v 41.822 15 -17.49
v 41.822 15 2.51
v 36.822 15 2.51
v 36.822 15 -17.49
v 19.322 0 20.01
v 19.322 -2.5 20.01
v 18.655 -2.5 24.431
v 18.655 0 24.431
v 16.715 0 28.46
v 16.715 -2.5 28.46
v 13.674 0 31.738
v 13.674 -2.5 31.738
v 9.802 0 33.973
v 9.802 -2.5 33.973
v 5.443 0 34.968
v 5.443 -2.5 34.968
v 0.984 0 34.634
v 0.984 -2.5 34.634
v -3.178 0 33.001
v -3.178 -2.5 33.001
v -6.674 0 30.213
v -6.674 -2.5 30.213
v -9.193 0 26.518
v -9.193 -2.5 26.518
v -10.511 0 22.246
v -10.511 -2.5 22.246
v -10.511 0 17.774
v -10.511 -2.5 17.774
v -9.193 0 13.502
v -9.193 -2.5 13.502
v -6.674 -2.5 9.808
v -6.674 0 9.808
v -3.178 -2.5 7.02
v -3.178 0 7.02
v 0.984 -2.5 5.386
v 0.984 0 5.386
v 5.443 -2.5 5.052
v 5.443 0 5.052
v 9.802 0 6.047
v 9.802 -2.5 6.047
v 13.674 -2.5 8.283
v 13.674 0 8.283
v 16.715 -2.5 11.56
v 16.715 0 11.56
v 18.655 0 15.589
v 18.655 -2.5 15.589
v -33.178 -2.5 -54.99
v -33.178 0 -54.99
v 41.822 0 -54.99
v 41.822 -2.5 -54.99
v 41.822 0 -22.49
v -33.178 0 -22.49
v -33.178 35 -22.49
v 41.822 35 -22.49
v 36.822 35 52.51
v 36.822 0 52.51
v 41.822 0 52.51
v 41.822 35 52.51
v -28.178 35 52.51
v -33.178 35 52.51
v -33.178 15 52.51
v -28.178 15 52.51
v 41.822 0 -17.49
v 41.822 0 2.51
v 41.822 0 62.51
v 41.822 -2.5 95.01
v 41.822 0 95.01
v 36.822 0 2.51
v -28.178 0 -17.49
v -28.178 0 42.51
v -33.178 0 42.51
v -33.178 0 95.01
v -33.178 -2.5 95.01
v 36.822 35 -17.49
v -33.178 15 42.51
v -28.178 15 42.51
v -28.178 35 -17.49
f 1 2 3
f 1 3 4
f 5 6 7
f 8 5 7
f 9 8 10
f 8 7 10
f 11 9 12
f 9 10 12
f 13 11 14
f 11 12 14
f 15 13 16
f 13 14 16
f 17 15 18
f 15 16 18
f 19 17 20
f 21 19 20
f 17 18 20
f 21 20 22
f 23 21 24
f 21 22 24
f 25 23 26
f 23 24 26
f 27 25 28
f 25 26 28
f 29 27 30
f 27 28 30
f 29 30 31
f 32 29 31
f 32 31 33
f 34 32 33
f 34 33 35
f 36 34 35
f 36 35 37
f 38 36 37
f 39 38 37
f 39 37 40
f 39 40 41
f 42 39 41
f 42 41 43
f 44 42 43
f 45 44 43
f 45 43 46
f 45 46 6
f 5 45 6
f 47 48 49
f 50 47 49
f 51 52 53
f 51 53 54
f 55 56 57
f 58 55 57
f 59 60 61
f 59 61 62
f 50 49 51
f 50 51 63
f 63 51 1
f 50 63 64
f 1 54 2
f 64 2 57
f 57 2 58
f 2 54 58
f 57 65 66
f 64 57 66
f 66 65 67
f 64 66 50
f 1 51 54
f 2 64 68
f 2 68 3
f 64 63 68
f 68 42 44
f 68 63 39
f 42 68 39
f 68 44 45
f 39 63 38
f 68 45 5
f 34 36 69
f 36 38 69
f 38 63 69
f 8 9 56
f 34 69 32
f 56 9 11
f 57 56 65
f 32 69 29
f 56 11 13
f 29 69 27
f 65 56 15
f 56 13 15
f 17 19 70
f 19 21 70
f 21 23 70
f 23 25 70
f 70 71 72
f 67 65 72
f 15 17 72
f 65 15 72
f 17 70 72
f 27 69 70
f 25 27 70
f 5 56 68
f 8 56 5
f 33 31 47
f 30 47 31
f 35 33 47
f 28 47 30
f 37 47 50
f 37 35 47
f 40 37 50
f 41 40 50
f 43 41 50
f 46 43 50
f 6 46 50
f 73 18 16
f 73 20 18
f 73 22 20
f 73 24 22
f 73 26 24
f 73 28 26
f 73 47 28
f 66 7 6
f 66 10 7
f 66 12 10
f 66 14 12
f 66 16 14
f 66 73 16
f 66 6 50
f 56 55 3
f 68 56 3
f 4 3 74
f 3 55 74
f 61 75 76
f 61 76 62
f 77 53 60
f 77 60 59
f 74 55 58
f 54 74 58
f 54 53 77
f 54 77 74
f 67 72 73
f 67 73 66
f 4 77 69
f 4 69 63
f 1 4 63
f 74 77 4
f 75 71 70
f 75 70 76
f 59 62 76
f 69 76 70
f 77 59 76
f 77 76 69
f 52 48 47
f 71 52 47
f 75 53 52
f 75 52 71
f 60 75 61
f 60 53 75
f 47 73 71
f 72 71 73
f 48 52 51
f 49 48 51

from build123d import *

# Parameters (mm, degrees)
SKETCH3_W           = 75
SKETCH3_H           = 85
BOSS_EXTRUDE1_DEPTH = 35
SKETCH4_W           = 65
SKETCH4_H           = 75
CUT_EXTRUDE1_DEPTH  = 40
SKETCH8_W           = 75
SKETCH8_H           = 150
BOSS_EXTRUDE2_DEPTH = 2.5
SKETCH9_R           = 15
CUT_EXTRUDE4_DEPTH  = 15
SKETCH10_W          = 75
SKETCH10_H          = 33.016749553
CUT_EXTRUDE5_DEPTH  = 10
SKETCH16_W          = 20
SKETCH16_H          = 15
CUT_EXTRUDE6_DEPTH  = 10
SKETCH17_W          = 10
SKETCH17_H          = 1.983250447
CUT_EXTRUDE7_DEPTH  = 66
SKETCH19_W          = 20
SKETCH19_H          = 15
CUT_EXTRUDE8_DEPTH  = 10


with BuildPart() as part:
    # Sketch3 → Boss-Extrude1 (new body)
    with BuildSketch(Plane(origin=(0, 0, 0), x_dir=(1, 0, 0), z_dir=(0, 1, 0))):
        with Locations((4.321862348, -20.010121457)):
            Rectangle(SKETCH3_W, SKETCH3_H)
    extrude(amount=BOSS_EXTRUDE1_DEPTH)

    # Sketch4 → Cut-Extrude1 (cut)
    with BuildSketch(Plane(origin=(0, 35, 0), x_dir=(1, 0, 0), z_dir=(0, 1, 0))):
        with Locations((4.321862348, -20.010121457)):
            Rectangle(SKETCH4_W, SKETCH4_H)
    extrude(amount=-CUT_EXTRUDE1_DEPTH, mode=Mode.SUBTRACT)

    # Sketch8 → Boss-Extrude2 (add)
    with BuildSketch(Plane.XZ):
        with Locations((4.321862348, 20.010121457)):
            Rectangle(SKETCH8_W, SKETCH8_H)
    extrude(amount=BOSS_EXTRUDE2_DEPTH)

    # Sketch9 → Cut-Extrude4 (cut)
    with BuildSketch(Plane.XZ.offset(2.5)):
        with Locations((4.321862348, 20.010121457)):
            Circle(SKETCH9_R)
    extrude(amount=-CUT_EXTRUDE4_DEPTH, mode=Mode.SUBTRACT)

    # Sketch10 → Cut-Extrude5 (cut)
    with BuildSketch(Plane.XY.offset(62.510121457)):
        with Locations((4.321862348, 18.491625224)):
            Rectangle(SKETCH10_W, SKETCH10_H)
    extrude(amount=-CUT_EXTRUDE5_DEPTH, mode=Mode.SUBTRACT)

    # Sketch16 → Cut-Extrude6 (cut)
    with BuildSketch(Plane.ZY.offset(33.178137652)):
        with Locations((52.510121457, 7.5)):
            Rectangle(SKETCH16_W, SKETCH16_H)
    extrude(amount=-CUT_EXTRUDE6_DEPTH, mode=Mode.SUBTRACT)

    # Sketch17 → Cut-Extrude7 (cut, through all)
    with BuildSketch(Plane.ZY.offset(23.178137652)):
        with Locations((57.510121457, 0.991625224)):
            Rectangle(SKETCH17_W, SKETCH17_H)
    extrude(amount=-CUT_EXTRUDE7_DEPTH, mode=Mode.SUBTRACT)

    # Sketch19 → Cut-Extrude8 (cut)
    with BuildSketch(Plane(origin=(41.821862348, 0, 0), x_dir=(0, 0, -1), z_dir=(1, 0, 0))):
        with Locations((7.489878543, 7.5)):
            Rectangle(SKETCH19_W, SKETCH19_H)
    extrude(amount=-CUT_EXTRUDE8_DEPTH, mode=Mode.SUBTRACT)


solid = part.part
